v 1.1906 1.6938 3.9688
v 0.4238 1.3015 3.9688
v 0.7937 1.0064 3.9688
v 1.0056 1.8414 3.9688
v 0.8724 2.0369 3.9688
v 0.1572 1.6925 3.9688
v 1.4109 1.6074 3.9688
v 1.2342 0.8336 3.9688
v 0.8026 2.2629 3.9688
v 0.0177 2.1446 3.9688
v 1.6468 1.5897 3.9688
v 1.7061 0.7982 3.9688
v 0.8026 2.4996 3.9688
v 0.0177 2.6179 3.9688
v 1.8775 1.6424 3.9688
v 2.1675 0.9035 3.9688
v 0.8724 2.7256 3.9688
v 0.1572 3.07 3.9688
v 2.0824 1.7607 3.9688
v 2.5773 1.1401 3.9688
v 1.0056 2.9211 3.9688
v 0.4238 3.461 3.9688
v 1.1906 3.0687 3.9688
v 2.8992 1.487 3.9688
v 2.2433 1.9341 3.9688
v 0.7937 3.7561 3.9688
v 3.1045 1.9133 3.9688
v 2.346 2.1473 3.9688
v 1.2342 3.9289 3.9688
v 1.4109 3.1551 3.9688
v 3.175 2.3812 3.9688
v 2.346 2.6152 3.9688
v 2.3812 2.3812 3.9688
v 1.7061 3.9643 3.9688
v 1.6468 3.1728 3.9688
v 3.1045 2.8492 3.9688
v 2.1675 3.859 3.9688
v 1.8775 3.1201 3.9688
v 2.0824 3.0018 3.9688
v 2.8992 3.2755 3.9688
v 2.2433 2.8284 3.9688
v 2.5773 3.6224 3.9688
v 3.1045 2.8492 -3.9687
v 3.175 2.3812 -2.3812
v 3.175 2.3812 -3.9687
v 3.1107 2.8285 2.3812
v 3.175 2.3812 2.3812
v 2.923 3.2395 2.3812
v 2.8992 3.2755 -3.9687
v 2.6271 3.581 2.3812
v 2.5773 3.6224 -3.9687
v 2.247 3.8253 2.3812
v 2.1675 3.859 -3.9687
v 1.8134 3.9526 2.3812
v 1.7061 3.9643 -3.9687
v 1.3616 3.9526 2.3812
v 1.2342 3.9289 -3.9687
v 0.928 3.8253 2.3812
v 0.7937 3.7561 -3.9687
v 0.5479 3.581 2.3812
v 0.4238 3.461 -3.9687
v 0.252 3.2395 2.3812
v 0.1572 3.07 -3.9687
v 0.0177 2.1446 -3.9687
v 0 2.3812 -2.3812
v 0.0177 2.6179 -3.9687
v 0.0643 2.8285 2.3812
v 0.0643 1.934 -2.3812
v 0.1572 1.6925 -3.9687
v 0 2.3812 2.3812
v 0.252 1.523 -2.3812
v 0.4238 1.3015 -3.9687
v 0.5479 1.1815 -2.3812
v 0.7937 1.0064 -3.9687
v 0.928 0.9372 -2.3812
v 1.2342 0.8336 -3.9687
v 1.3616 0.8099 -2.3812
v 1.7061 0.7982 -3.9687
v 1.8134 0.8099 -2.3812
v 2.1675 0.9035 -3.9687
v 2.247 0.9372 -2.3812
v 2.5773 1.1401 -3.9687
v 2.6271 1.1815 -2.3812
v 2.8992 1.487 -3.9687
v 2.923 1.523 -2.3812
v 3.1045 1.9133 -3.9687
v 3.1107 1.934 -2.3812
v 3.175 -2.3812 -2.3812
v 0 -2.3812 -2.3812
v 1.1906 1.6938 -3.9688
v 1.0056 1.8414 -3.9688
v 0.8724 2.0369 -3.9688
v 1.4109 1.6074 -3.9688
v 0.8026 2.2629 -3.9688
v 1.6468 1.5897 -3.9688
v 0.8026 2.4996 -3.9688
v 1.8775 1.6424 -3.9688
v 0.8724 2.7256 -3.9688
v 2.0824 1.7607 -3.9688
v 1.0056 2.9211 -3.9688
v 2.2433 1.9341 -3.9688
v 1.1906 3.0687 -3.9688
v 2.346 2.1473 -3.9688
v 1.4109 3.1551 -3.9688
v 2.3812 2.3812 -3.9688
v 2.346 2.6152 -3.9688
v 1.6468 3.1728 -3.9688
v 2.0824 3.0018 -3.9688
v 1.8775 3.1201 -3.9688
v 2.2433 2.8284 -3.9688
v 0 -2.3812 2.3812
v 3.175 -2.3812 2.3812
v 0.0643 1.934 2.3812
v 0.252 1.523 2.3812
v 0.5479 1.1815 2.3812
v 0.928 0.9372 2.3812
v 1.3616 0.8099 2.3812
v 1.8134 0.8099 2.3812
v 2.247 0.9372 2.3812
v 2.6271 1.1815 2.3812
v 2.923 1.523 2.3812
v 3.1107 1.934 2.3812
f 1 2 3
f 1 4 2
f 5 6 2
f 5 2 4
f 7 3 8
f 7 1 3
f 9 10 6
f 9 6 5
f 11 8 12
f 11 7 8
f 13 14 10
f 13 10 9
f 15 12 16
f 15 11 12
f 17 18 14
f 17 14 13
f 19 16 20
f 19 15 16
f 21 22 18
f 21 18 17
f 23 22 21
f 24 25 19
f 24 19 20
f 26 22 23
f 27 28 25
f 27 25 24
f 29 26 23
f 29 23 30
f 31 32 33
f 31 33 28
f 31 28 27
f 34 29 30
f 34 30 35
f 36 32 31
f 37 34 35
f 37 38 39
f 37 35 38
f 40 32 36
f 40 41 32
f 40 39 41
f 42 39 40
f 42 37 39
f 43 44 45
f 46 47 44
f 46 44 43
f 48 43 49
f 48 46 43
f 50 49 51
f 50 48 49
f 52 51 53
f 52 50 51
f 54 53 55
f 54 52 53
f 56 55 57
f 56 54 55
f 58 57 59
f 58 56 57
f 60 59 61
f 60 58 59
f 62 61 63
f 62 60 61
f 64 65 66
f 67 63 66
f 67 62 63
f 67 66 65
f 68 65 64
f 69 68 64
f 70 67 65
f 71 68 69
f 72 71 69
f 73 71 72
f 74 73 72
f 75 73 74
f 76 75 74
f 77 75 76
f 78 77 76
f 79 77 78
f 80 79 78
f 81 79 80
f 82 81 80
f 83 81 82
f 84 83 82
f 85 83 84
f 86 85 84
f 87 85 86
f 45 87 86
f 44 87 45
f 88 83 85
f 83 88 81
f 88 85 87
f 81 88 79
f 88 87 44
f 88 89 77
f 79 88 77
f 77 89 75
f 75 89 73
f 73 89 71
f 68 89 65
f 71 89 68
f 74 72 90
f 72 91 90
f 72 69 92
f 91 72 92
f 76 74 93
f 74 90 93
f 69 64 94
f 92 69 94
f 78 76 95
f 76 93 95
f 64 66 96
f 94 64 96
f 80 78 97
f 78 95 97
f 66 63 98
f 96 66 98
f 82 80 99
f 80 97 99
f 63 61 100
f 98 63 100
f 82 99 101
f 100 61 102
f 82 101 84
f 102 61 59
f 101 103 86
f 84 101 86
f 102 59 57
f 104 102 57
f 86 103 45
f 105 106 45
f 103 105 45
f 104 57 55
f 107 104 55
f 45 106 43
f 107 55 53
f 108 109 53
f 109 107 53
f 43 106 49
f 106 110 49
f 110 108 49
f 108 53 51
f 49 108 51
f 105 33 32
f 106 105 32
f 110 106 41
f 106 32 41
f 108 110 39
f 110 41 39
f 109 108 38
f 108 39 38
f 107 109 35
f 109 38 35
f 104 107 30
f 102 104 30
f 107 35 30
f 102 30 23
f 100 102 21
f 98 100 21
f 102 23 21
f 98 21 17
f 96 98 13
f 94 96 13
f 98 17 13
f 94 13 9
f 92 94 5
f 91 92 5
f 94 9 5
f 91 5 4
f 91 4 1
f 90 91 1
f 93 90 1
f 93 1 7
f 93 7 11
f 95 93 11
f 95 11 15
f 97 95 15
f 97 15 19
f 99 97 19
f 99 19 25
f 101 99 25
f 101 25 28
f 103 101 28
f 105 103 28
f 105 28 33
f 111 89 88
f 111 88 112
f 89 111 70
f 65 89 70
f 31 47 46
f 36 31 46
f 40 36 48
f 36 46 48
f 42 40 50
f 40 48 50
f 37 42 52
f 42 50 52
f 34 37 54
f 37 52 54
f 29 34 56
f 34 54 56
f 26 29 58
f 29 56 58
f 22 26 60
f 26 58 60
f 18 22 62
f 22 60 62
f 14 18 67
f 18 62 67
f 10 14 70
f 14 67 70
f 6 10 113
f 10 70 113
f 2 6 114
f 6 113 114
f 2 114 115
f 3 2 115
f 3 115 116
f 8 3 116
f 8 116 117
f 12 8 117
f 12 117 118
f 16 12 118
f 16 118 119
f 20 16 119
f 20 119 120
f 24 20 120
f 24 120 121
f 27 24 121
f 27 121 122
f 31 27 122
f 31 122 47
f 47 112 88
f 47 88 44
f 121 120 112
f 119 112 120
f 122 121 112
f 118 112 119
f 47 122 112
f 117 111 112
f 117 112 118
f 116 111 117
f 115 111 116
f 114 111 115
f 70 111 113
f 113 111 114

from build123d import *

# Parameters (mm, degrees)
F0_W     = 4.7625
F0_H     = 4.7625
F1_DEPTH = 3.175
F2_R     = 1.5875
F3_DEPTH = 6.35
F4_DEPTH = 1.5875
F5_R     = 0.79375
F6_DEPTH = 7.9385


with BuildPart() as f1:
    # F0 (on Right) → F1 (new body)
    with BuildSketch(Plane.YZ):
        Rectangle(F0_W, F0_H)
    extrude(amount=F1_DEPTH)

    # F2 (on face) → F3 (join)
    with BuildSketch(Plane.XY.offset(2.38125)):
        with Locations((1.5875, 2.38125)):
            Circle(F2_R)
    extrude(amount=-F3_DEPTH)

    # F2 (on face) → F4 (join)
    with BuildSketch(Plane.XY.offset(2.38125)):
        with Locations((1.5875, 2.38125)):
            Circle(F2_R)
    extrude(amount=F4_DEPTH)

    # F5 (on face) → F6 (cut, through all)
    with BuildSketch(Plane.XY.offset(3.96875)):
        with Locations((1.5875, 2.38125)):
            Circle(F5_R)
    extrude(amount=-F6_DEPTH, mode=Mode.SUBTRACT)


solid = f1.part
